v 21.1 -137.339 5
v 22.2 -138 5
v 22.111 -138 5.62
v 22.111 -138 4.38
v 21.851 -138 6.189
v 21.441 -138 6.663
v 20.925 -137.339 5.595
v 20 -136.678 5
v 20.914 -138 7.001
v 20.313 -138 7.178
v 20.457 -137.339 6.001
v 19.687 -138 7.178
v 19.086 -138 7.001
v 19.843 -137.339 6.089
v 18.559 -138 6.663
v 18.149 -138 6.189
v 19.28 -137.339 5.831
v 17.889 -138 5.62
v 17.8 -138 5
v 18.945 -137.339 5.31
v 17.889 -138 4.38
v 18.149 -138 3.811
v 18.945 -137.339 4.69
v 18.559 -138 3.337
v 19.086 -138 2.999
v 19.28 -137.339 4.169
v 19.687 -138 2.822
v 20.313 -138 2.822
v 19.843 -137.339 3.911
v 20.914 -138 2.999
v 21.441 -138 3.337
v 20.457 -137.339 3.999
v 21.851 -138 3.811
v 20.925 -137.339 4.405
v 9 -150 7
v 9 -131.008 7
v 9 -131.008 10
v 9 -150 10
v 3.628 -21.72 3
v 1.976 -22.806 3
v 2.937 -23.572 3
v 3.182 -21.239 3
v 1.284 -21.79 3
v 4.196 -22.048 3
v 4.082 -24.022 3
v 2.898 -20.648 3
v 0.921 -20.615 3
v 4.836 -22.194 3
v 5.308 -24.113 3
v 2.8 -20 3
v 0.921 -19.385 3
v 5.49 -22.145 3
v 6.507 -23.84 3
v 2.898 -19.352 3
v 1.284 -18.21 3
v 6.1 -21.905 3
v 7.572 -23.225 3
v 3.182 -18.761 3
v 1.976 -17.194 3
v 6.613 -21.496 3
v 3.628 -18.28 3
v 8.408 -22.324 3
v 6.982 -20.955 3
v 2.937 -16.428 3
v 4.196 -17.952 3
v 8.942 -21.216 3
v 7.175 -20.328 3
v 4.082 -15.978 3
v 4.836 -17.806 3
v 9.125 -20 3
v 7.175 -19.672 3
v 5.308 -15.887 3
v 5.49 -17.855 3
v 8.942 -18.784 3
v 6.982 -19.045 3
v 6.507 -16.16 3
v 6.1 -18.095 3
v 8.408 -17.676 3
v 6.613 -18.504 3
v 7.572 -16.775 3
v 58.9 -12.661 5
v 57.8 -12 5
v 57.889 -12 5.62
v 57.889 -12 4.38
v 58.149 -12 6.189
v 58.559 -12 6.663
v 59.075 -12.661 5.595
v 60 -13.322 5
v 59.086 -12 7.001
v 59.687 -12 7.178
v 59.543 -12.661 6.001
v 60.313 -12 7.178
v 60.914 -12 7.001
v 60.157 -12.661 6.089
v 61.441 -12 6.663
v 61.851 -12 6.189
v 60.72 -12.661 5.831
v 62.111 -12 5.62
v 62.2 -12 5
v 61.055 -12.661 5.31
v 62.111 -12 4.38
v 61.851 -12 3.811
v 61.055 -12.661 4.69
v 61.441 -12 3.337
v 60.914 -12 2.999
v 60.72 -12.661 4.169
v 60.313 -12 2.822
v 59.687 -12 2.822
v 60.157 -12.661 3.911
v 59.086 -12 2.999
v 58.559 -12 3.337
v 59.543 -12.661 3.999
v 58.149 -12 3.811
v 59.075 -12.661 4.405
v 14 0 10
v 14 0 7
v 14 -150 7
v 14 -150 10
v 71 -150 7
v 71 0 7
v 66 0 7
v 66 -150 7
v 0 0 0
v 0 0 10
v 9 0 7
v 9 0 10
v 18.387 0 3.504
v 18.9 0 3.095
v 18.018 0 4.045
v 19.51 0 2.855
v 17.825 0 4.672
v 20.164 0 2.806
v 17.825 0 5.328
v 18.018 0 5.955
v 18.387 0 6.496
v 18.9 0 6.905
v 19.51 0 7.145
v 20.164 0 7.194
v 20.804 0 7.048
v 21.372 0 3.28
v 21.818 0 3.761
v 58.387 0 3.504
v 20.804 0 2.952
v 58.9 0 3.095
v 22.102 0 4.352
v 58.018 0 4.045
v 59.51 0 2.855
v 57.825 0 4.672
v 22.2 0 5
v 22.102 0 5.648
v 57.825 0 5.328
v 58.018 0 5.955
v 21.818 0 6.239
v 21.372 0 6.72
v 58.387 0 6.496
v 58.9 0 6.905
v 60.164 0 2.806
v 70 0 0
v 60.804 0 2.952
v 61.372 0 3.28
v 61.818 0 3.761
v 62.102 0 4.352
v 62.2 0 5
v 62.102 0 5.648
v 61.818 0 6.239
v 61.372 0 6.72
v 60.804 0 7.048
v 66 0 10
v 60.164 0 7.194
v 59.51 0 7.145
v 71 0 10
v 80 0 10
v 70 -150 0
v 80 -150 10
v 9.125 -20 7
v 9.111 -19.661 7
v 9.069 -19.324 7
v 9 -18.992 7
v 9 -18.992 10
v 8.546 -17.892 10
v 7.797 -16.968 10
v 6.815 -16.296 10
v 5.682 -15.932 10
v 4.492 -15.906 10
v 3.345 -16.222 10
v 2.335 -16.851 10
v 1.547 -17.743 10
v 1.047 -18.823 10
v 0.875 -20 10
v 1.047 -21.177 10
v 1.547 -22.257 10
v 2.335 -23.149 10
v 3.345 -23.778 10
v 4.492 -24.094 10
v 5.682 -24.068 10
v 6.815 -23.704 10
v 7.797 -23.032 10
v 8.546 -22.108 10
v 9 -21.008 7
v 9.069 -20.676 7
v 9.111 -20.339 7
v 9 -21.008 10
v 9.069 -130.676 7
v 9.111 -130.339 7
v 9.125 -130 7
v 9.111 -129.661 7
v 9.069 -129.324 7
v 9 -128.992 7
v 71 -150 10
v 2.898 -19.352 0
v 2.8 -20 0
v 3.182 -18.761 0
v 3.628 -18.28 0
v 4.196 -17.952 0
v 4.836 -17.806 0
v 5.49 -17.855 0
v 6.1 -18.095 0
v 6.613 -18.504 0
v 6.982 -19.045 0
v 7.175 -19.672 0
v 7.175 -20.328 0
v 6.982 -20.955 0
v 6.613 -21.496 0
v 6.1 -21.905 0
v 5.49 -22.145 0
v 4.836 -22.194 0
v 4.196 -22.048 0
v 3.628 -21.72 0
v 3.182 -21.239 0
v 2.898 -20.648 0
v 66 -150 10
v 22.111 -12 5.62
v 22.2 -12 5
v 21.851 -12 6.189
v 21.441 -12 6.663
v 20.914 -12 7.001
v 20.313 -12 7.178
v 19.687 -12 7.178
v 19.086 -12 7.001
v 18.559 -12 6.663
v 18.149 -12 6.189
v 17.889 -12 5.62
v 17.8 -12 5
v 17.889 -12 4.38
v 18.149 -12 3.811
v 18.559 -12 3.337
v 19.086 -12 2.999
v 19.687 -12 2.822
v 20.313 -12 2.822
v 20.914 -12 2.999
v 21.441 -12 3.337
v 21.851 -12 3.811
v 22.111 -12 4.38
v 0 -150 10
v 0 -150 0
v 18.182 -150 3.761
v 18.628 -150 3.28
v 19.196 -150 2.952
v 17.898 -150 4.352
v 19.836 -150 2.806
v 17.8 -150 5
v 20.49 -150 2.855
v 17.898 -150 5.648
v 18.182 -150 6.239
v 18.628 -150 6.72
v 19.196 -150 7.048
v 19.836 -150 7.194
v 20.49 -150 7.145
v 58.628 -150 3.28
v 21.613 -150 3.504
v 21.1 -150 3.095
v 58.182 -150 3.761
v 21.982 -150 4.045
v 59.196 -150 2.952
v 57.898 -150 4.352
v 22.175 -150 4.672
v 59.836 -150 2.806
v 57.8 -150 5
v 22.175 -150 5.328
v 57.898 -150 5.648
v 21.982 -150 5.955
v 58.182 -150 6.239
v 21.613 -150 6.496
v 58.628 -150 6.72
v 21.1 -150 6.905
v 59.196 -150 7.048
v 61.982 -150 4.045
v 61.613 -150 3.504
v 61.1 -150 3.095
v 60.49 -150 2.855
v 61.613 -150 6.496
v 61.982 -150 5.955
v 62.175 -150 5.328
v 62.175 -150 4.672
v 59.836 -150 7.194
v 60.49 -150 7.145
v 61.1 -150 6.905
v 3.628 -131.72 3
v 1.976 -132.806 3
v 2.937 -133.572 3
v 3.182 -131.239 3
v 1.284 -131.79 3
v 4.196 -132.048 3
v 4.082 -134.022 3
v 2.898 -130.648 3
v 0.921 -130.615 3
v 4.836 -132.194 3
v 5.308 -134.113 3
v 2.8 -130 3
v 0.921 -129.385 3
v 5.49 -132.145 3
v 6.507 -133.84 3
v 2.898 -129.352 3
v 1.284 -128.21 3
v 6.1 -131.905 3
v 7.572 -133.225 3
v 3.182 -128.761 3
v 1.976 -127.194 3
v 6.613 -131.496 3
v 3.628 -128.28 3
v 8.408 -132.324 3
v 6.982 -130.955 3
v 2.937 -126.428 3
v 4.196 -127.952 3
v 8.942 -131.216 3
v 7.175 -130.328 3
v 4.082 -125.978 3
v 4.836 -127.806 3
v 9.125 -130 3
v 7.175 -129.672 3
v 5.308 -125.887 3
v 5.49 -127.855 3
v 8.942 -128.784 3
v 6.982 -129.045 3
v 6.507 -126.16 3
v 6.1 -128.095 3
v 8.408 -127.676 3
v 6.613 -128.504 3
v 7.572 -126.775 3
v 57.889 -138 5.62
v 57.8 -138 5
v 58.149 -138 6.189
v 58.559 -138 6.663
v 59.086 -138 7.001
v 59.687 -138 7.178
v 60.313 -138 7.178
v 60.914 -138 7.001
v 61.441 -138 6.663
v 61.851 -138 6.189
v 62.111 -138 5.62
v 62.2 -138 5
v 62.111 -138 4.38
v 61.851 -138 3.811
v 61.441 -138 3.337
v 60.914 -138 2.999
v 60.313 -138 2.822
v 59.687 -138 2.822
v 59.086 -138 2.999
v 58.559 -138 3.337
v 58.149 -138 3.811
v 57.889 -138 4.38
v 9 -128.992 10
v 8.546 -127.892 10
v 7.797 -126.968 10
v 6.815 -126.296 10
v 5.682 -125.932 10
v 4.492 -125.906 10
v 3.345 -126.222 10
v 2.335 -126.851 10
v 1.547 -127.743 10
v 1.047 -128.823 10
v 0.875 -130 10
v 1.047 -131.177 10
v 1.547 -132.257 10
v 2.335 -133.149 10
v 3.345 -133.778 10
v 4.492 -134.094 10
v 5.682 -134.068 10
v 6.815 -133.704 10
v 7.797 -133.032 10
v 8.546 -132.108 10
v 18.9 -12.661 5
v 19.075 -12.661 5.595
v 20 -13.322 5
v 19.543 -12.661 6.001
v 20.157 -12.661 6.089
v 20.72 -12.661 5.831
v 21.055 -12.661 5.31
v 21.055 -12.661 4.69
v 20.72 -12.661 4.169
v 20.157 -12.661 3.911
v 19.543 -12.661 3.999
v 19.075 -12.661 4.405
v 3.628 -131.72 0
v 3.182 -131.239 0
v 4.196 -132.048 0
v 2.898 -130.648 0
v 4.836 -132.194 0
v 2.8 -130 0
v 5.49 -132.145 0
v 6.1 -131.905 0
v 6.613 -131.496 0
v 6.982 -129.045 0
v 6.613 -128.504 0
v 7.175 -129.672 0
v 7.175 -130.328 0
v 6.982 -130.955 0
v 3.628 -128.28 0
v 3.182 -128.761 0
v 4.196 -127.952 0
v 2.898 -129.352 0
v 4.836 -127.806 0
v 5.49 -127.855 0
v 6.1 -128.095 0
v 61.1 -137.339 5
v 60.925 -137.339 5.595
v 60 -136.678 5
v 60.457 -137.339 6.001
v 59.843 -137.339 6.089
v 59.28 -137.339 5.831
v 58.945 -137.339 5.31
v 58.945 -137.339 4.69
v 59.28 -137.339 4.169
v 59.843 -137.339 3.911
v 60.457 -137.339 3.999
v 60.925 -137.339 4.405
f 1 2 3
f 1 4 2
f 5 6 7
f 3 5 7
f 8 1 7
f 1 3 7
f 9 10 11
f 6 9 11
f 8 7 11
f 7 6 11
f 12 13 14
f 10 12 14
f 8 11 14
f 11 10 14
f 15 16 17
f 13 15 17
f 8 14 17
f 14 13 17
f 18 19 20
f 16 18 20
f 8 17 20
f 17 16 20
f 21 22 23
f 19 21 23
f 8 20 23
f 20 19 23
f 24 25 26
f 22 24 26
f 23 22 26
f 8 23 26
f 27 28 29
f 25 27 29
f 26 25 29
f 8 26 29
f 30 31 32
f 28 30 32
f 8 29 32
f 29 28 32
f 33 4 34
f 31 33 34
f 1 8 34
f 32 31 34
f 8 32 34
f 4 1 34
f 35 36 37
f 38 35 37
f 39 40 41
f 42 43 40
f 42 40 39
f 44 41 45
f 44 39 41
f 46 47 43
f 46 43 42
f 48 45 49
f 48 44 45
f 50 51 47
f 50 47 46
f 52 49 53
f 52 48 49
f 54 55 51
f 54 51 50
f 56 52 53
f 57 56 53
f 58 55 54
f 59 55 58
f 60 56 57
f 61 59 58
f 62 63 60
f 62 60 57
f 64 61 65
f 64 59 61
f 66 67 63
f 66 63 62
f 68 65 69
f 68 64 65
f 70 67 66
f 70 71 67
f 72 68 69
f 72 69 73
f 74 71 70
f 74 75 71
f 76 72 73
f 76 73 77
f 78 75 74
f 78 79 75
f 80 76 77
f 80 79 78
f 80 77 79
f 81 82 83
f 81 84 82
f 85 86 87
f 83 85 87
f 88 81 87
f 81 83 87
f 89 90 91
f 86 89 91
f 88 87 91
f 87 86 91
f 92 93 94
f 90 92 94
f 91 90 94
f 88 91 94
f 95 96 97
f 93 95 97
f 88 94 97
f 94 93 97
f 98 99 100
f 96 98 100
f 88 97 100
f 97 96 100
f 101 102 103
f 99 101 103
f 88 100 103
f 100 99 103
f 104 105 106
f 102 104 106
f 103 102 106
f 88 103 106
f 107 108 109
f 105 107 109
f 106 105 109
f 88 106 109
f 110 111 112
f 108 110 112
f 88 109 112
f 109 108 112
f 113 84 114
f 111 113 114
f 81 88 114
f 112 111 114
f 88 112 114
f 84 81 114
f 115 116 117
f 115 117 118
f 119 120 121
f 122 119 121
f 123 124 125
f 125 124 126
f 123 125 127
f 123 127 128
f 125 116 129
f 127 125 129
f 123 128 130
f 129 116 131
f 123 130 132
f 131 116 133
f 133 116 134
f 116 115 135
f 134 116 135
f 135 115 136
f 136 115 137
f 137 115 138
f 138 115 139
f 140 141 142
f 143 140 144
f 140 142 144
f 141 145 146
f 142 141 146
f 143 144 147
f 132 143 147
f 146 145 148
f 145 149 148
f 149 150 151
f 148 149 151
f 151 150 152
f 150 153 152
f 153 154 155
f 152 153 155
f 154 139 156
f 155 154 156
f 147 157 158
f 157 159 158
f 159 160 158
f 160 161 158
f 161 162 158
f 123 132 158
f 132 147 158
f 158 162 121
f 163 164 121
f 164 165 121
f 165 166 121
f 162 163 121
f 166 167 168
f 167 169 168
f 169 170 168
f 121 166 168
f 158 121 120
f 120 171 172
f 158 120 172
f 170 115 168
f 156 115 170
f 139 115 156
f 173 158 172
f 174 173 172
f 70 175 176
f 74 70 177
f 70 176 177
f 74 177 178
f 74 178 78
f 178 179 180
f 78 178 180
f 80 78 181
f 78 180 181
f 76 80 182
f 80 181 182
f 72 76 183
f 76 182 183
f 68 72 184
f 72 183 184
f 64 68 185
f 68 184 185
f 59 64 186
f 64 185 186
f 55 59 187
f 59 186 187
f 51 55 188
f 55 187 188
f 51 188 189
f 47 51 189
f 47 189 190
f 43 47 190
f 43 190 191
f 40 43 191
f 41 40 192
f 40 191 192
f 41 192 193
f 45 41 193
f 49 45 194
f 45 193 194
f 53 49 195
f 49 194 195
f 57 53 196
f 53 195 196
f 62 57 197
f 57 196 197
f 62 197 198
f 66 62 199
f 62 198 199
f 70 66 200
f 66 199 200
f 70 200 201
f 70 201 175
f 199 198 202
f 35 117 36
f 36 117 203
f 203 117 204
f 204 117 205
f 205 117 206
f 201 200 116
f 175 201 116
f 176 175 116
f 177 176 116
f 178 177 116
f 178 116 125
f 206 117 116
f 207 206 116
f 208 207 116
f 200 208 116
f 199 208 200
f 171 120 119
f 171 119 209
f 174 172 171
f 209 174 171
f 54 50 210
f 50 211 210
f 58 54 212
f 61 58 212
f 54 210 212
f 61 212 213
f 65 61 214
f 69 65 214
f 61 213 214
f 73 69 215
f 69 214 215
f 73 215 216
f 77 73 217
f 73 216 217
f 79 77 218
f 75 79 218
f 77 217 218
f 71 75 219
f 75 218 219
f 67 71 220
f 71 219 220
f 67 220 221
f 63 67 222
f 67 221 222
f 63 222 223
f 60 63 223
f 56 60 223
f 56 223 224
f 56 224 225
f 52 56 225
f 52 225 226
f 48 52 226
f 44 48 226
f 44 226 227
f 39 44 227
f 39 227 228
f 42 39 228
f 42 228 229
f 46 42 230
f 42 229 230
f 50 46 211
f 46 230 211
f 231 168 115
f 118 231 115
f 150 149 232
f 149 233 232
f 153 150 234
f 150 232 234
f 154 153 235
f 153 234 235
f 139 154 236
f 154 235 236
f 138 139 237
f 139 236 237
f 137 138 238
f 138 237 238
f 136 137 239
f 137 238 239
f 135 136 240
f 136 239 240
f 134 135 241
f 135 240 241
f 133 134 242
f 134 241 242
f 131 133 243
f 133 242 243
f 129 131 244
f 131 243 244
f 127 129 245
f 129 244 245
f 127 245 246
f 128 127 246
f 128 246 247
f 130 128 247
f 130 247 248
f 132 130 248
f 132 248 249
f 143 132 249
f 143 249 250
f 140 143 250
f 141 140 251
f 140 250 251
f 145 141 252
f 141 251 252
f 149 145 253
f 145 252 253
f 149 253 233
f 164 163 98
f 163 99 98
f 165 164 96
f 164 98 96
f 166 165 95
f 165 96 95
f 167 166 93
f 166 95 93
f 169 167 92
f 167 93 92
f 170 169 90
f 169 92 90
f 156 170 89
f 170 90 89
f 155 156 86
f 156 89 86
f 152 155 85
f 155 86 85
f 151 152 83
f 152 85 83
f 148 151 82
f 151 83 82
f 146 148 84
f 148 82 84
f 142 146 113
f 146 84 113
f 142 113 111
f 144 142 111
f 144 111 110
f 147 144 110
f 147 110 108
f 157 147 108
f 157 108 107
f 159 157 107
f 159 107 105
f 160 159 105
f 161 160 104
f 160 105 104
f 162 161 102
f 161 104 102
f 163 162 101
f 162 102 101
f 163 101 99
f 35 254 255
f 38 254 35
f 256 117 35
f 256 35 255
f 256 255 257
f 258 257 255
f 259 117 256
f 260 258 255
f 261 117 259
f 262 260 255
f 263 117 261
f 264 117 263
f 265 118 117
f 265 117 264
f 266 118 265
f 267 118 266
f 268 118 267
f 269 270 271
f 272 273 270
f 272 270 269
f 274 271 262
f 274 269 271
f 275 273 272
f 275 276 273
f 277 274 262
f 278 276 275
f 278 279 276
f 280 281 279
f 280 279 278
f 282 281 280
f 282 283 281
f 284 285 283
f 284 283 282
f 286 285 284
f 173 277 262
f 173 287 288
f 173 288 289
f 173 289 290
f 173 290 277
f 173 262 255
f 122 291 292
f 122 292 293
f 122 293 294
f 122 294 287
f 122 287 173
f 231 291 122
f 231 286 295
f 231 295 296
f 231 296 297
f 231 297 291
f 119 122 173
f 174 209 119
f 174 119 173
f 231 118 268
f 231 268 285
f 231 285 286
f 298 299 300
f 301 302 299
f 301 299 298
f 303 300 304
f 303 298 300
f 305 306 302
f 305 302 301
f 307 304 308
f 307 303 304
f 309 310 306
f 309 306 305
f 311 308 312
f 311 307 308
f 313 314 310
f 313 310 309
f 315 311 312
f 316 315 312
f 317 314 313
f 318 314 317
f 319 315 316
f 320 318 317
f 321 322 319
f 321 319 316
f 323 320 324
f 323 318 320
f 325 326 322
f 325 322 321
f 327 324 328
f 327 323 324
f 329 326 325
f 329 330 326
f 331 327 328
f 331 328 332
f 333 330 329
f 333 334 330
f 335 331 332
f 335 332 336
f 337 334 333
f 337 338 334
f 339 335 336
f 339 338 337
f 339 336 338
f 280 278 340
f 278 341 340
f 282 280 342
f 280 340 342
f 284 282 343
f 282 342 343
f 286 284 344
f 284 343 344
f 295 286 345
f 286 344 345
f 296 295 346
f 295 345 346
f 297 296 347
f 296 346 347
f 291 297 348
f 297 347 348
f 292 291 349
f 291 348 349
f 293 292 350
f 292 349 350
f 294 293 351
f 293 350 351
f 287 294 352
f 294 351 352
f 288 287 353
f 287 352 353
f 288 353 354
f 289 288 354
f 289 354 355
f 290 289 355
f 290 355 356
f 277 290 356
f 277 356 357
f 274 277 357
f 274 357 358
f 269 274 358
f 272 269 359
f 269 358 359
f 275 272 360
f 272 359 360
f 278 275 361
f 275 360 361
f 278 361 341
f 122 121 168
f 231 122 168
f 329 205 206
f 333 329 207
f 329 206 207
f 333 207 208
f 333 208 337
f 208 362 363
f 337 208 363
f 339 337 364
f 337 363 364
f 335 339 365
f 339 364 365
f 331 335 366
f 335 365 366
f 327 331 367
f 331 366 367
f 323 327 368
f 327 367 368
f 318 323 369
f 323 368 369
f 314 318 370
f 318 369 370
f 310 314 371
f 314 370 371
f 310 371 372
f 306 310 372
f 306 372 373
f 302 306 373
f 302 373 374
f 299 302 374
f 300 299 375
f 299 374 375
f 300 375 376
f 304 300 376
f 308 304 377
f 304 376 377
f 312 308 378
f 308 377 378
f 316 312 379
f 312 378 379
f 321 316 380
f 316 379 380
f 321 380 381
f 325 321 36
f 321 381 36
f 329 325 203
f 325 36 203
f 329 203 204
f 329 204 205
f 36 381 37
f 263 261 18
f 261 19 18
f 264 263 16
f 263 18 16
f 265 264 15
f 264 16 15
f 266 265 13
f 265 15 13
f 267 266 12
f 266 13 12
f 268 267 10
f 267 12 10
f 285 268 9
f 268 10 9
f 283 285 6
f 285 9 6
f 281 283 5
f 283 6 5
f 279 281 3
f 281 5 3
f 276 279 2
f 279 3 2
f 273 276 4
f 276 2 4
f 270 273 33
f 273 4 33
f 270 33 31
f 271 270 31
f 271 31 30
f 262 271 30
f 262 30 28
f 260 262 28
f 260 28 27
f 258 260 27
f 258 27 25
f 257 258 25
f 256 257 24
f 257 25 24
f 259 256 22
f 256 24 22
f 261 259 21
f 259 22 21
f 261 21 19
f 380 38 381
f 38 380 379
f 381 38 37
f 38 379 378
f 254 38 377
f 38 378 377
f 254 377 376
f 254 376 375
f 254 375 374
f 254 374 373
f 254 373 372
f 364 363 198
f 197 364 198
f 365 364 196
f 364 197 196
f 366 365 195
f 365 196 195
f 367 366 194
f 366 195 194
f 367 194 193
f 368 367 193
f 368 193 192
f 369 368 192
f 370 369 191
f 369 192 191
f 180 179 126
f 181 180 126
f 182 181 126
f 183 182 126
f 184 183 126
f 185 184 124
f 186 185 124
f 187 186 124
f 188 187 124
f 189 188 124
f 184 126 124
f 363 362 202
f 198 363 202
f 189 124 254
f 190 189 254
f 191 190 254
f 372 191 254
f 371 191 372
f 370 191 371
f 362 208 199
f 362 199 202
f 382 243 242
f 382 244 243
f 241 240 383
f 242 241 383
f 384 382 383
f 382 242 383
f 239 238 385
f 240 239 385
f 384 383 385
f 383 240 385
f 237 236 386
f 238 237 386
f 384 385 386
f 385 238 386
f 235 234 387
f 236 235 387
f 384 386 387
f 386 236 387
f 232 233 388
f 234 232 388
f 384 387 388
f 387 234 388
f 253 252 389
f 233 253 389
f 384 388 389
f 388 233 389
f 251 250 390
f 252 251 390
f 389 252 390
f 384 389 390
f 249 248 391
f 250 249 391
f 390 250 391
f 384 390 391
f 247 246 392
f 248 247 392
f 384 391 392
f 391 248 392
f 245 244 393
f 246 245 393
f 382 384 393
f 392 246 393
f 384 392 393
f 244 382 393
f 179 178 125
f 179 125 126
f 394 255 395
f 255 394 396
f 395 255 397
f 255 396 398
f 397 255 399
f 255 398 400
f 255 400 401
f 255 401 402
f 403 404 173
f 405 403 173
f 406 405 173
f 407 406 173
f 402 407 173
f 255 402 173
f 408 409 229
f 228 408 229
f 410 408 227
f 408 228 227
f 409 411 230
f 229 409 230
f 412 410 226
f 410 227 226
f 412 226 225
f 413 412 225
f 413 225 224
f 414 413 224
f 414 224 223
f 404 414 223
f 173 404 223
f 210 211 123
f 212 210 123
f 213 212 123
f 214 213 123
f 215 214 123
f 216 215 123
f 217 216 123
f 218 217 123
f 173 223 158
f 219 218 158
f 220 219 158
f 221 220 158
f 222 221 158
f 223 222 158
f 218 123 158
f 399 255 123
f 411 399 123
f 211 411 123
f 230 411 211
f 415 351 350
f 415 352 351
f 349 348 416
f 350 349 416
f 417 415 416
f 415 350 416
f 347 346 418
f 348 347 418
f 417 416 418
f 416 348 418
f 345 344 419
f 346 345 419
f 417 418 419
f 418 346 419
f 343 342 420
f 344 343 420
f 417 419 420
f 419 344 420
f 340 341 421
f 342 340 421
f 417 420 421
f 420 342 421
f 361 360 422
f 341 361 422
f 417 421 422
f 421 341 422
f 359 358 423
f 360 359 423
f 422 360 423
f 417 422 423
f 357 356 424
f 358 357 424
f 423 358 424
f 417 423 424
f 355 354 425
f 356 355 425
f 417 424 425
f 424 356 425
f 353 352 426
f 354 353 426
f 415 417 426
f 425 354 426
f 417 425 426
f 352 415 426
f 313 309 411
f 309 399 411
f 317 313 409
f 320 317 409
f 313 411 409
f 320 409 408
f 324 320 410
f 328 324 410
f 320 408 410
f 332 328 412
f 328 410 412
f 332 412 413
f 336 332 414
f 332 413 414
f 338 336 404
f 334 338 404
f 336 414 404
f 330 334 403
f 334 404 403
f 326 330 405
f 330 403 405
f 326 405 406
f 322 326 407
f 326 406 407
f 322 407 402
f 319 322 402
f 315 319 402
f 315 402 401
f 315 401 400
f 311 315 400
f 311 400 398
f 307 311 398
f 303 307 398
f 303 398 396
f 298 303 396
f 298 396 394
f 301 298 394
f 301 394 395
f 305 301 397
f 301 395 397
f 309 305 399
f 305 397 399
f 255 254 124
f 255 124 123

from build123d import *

# Parameters (mm, degrees)
F1_DEPTH       = 150
F3_D           = 4.4
F3_DEPTH       = 12
F3_TIP         = 1.3218933619
F5_D           = 4.4
F5_DEPTH       = 12
F5_TIP         = 1.3218933619
F6_W           = 5
F6_H           = 3
F7_DEPTH       = 150
F9_D           = 4.4
F9_DEPTH       = 14.1
F9_START       = 3
F9_CBORE_D     = 8.25
F9_CBORE_DEPTH = 4
F9_TIP         = 1.3218933619


with BuildPart() as f1:
    # F0 (on Front) → F1 (new body)
    with BuildSketch(Plane.XZ):
        Polygon((0, 10), (0, 0), (70, 0), (80, 10), align=None)
    extrude(amount=F1_DEPTH)

    # F3
    with Locations(Plane.XZ.offset(150)):
        with Locations((20, 5), (60, 5)):
            Hole(F3_D / 2, depth=F3_DEPTH)
            with Locations((0, 0, -(F3_DEPTH + F3_TIP / 2))):  # 118° drill point
                Cone(0, F3_D / 2, F3_TIP, mode=Mode.SUBTRACT)

    # F5
    with Locations(Plane(origin=(0, 0, 0), x_dir=(-1, 0, 0), z_dir=(0, 1, 0))):
        with Locations((-60, 5), (-20, 5)):
            Hole(F5_D / 2, depth=F5_DEPTH)
            with Locations((0, 0, -(F5_DEPTH + F5_TIP / 2))):  # 118° drill point
                Cone(0, F5_D / 2, F5_TIP, mode=Mode.SUBTRACT)

    # F6 (on face) → F7 (cut, through all)
    with BuildSketch(Plane(origin=(0, 0, 0), x_dir=(-1, 0, 0), z_dir=(0, 1, 0))):
        with Locations((-68.5, 8.5)):
            Rectangle(F6_W, F6_H)
        with Locations((-11.5, 8.5)):
            Rectangle(F6_W, F6_H)
    extrude(amount=-F7_DEPTH, mode=Mode.SUBTRACT)

    # F9
    # its depths count from where the whole tool has entered the part; down to there all is cleared
    with Locations(Plane.XY.offset(10).offset(-F9_START)):
        with Locations((5, -130), (5, -20)):
            CounterBoreHole(F9_D / 2, F9_CBORE_D / 2, F9_CBORE_DEPTH, depth=F9_DEPTH)
            with Locations((0, 0, -(F9_DEPTH + F9_TIP / 2))):  # 118° drill point
                Cone(0, F9_D / 2, F9_TIP, mode=Mode.SUBTRACT)


solid = f1.part
